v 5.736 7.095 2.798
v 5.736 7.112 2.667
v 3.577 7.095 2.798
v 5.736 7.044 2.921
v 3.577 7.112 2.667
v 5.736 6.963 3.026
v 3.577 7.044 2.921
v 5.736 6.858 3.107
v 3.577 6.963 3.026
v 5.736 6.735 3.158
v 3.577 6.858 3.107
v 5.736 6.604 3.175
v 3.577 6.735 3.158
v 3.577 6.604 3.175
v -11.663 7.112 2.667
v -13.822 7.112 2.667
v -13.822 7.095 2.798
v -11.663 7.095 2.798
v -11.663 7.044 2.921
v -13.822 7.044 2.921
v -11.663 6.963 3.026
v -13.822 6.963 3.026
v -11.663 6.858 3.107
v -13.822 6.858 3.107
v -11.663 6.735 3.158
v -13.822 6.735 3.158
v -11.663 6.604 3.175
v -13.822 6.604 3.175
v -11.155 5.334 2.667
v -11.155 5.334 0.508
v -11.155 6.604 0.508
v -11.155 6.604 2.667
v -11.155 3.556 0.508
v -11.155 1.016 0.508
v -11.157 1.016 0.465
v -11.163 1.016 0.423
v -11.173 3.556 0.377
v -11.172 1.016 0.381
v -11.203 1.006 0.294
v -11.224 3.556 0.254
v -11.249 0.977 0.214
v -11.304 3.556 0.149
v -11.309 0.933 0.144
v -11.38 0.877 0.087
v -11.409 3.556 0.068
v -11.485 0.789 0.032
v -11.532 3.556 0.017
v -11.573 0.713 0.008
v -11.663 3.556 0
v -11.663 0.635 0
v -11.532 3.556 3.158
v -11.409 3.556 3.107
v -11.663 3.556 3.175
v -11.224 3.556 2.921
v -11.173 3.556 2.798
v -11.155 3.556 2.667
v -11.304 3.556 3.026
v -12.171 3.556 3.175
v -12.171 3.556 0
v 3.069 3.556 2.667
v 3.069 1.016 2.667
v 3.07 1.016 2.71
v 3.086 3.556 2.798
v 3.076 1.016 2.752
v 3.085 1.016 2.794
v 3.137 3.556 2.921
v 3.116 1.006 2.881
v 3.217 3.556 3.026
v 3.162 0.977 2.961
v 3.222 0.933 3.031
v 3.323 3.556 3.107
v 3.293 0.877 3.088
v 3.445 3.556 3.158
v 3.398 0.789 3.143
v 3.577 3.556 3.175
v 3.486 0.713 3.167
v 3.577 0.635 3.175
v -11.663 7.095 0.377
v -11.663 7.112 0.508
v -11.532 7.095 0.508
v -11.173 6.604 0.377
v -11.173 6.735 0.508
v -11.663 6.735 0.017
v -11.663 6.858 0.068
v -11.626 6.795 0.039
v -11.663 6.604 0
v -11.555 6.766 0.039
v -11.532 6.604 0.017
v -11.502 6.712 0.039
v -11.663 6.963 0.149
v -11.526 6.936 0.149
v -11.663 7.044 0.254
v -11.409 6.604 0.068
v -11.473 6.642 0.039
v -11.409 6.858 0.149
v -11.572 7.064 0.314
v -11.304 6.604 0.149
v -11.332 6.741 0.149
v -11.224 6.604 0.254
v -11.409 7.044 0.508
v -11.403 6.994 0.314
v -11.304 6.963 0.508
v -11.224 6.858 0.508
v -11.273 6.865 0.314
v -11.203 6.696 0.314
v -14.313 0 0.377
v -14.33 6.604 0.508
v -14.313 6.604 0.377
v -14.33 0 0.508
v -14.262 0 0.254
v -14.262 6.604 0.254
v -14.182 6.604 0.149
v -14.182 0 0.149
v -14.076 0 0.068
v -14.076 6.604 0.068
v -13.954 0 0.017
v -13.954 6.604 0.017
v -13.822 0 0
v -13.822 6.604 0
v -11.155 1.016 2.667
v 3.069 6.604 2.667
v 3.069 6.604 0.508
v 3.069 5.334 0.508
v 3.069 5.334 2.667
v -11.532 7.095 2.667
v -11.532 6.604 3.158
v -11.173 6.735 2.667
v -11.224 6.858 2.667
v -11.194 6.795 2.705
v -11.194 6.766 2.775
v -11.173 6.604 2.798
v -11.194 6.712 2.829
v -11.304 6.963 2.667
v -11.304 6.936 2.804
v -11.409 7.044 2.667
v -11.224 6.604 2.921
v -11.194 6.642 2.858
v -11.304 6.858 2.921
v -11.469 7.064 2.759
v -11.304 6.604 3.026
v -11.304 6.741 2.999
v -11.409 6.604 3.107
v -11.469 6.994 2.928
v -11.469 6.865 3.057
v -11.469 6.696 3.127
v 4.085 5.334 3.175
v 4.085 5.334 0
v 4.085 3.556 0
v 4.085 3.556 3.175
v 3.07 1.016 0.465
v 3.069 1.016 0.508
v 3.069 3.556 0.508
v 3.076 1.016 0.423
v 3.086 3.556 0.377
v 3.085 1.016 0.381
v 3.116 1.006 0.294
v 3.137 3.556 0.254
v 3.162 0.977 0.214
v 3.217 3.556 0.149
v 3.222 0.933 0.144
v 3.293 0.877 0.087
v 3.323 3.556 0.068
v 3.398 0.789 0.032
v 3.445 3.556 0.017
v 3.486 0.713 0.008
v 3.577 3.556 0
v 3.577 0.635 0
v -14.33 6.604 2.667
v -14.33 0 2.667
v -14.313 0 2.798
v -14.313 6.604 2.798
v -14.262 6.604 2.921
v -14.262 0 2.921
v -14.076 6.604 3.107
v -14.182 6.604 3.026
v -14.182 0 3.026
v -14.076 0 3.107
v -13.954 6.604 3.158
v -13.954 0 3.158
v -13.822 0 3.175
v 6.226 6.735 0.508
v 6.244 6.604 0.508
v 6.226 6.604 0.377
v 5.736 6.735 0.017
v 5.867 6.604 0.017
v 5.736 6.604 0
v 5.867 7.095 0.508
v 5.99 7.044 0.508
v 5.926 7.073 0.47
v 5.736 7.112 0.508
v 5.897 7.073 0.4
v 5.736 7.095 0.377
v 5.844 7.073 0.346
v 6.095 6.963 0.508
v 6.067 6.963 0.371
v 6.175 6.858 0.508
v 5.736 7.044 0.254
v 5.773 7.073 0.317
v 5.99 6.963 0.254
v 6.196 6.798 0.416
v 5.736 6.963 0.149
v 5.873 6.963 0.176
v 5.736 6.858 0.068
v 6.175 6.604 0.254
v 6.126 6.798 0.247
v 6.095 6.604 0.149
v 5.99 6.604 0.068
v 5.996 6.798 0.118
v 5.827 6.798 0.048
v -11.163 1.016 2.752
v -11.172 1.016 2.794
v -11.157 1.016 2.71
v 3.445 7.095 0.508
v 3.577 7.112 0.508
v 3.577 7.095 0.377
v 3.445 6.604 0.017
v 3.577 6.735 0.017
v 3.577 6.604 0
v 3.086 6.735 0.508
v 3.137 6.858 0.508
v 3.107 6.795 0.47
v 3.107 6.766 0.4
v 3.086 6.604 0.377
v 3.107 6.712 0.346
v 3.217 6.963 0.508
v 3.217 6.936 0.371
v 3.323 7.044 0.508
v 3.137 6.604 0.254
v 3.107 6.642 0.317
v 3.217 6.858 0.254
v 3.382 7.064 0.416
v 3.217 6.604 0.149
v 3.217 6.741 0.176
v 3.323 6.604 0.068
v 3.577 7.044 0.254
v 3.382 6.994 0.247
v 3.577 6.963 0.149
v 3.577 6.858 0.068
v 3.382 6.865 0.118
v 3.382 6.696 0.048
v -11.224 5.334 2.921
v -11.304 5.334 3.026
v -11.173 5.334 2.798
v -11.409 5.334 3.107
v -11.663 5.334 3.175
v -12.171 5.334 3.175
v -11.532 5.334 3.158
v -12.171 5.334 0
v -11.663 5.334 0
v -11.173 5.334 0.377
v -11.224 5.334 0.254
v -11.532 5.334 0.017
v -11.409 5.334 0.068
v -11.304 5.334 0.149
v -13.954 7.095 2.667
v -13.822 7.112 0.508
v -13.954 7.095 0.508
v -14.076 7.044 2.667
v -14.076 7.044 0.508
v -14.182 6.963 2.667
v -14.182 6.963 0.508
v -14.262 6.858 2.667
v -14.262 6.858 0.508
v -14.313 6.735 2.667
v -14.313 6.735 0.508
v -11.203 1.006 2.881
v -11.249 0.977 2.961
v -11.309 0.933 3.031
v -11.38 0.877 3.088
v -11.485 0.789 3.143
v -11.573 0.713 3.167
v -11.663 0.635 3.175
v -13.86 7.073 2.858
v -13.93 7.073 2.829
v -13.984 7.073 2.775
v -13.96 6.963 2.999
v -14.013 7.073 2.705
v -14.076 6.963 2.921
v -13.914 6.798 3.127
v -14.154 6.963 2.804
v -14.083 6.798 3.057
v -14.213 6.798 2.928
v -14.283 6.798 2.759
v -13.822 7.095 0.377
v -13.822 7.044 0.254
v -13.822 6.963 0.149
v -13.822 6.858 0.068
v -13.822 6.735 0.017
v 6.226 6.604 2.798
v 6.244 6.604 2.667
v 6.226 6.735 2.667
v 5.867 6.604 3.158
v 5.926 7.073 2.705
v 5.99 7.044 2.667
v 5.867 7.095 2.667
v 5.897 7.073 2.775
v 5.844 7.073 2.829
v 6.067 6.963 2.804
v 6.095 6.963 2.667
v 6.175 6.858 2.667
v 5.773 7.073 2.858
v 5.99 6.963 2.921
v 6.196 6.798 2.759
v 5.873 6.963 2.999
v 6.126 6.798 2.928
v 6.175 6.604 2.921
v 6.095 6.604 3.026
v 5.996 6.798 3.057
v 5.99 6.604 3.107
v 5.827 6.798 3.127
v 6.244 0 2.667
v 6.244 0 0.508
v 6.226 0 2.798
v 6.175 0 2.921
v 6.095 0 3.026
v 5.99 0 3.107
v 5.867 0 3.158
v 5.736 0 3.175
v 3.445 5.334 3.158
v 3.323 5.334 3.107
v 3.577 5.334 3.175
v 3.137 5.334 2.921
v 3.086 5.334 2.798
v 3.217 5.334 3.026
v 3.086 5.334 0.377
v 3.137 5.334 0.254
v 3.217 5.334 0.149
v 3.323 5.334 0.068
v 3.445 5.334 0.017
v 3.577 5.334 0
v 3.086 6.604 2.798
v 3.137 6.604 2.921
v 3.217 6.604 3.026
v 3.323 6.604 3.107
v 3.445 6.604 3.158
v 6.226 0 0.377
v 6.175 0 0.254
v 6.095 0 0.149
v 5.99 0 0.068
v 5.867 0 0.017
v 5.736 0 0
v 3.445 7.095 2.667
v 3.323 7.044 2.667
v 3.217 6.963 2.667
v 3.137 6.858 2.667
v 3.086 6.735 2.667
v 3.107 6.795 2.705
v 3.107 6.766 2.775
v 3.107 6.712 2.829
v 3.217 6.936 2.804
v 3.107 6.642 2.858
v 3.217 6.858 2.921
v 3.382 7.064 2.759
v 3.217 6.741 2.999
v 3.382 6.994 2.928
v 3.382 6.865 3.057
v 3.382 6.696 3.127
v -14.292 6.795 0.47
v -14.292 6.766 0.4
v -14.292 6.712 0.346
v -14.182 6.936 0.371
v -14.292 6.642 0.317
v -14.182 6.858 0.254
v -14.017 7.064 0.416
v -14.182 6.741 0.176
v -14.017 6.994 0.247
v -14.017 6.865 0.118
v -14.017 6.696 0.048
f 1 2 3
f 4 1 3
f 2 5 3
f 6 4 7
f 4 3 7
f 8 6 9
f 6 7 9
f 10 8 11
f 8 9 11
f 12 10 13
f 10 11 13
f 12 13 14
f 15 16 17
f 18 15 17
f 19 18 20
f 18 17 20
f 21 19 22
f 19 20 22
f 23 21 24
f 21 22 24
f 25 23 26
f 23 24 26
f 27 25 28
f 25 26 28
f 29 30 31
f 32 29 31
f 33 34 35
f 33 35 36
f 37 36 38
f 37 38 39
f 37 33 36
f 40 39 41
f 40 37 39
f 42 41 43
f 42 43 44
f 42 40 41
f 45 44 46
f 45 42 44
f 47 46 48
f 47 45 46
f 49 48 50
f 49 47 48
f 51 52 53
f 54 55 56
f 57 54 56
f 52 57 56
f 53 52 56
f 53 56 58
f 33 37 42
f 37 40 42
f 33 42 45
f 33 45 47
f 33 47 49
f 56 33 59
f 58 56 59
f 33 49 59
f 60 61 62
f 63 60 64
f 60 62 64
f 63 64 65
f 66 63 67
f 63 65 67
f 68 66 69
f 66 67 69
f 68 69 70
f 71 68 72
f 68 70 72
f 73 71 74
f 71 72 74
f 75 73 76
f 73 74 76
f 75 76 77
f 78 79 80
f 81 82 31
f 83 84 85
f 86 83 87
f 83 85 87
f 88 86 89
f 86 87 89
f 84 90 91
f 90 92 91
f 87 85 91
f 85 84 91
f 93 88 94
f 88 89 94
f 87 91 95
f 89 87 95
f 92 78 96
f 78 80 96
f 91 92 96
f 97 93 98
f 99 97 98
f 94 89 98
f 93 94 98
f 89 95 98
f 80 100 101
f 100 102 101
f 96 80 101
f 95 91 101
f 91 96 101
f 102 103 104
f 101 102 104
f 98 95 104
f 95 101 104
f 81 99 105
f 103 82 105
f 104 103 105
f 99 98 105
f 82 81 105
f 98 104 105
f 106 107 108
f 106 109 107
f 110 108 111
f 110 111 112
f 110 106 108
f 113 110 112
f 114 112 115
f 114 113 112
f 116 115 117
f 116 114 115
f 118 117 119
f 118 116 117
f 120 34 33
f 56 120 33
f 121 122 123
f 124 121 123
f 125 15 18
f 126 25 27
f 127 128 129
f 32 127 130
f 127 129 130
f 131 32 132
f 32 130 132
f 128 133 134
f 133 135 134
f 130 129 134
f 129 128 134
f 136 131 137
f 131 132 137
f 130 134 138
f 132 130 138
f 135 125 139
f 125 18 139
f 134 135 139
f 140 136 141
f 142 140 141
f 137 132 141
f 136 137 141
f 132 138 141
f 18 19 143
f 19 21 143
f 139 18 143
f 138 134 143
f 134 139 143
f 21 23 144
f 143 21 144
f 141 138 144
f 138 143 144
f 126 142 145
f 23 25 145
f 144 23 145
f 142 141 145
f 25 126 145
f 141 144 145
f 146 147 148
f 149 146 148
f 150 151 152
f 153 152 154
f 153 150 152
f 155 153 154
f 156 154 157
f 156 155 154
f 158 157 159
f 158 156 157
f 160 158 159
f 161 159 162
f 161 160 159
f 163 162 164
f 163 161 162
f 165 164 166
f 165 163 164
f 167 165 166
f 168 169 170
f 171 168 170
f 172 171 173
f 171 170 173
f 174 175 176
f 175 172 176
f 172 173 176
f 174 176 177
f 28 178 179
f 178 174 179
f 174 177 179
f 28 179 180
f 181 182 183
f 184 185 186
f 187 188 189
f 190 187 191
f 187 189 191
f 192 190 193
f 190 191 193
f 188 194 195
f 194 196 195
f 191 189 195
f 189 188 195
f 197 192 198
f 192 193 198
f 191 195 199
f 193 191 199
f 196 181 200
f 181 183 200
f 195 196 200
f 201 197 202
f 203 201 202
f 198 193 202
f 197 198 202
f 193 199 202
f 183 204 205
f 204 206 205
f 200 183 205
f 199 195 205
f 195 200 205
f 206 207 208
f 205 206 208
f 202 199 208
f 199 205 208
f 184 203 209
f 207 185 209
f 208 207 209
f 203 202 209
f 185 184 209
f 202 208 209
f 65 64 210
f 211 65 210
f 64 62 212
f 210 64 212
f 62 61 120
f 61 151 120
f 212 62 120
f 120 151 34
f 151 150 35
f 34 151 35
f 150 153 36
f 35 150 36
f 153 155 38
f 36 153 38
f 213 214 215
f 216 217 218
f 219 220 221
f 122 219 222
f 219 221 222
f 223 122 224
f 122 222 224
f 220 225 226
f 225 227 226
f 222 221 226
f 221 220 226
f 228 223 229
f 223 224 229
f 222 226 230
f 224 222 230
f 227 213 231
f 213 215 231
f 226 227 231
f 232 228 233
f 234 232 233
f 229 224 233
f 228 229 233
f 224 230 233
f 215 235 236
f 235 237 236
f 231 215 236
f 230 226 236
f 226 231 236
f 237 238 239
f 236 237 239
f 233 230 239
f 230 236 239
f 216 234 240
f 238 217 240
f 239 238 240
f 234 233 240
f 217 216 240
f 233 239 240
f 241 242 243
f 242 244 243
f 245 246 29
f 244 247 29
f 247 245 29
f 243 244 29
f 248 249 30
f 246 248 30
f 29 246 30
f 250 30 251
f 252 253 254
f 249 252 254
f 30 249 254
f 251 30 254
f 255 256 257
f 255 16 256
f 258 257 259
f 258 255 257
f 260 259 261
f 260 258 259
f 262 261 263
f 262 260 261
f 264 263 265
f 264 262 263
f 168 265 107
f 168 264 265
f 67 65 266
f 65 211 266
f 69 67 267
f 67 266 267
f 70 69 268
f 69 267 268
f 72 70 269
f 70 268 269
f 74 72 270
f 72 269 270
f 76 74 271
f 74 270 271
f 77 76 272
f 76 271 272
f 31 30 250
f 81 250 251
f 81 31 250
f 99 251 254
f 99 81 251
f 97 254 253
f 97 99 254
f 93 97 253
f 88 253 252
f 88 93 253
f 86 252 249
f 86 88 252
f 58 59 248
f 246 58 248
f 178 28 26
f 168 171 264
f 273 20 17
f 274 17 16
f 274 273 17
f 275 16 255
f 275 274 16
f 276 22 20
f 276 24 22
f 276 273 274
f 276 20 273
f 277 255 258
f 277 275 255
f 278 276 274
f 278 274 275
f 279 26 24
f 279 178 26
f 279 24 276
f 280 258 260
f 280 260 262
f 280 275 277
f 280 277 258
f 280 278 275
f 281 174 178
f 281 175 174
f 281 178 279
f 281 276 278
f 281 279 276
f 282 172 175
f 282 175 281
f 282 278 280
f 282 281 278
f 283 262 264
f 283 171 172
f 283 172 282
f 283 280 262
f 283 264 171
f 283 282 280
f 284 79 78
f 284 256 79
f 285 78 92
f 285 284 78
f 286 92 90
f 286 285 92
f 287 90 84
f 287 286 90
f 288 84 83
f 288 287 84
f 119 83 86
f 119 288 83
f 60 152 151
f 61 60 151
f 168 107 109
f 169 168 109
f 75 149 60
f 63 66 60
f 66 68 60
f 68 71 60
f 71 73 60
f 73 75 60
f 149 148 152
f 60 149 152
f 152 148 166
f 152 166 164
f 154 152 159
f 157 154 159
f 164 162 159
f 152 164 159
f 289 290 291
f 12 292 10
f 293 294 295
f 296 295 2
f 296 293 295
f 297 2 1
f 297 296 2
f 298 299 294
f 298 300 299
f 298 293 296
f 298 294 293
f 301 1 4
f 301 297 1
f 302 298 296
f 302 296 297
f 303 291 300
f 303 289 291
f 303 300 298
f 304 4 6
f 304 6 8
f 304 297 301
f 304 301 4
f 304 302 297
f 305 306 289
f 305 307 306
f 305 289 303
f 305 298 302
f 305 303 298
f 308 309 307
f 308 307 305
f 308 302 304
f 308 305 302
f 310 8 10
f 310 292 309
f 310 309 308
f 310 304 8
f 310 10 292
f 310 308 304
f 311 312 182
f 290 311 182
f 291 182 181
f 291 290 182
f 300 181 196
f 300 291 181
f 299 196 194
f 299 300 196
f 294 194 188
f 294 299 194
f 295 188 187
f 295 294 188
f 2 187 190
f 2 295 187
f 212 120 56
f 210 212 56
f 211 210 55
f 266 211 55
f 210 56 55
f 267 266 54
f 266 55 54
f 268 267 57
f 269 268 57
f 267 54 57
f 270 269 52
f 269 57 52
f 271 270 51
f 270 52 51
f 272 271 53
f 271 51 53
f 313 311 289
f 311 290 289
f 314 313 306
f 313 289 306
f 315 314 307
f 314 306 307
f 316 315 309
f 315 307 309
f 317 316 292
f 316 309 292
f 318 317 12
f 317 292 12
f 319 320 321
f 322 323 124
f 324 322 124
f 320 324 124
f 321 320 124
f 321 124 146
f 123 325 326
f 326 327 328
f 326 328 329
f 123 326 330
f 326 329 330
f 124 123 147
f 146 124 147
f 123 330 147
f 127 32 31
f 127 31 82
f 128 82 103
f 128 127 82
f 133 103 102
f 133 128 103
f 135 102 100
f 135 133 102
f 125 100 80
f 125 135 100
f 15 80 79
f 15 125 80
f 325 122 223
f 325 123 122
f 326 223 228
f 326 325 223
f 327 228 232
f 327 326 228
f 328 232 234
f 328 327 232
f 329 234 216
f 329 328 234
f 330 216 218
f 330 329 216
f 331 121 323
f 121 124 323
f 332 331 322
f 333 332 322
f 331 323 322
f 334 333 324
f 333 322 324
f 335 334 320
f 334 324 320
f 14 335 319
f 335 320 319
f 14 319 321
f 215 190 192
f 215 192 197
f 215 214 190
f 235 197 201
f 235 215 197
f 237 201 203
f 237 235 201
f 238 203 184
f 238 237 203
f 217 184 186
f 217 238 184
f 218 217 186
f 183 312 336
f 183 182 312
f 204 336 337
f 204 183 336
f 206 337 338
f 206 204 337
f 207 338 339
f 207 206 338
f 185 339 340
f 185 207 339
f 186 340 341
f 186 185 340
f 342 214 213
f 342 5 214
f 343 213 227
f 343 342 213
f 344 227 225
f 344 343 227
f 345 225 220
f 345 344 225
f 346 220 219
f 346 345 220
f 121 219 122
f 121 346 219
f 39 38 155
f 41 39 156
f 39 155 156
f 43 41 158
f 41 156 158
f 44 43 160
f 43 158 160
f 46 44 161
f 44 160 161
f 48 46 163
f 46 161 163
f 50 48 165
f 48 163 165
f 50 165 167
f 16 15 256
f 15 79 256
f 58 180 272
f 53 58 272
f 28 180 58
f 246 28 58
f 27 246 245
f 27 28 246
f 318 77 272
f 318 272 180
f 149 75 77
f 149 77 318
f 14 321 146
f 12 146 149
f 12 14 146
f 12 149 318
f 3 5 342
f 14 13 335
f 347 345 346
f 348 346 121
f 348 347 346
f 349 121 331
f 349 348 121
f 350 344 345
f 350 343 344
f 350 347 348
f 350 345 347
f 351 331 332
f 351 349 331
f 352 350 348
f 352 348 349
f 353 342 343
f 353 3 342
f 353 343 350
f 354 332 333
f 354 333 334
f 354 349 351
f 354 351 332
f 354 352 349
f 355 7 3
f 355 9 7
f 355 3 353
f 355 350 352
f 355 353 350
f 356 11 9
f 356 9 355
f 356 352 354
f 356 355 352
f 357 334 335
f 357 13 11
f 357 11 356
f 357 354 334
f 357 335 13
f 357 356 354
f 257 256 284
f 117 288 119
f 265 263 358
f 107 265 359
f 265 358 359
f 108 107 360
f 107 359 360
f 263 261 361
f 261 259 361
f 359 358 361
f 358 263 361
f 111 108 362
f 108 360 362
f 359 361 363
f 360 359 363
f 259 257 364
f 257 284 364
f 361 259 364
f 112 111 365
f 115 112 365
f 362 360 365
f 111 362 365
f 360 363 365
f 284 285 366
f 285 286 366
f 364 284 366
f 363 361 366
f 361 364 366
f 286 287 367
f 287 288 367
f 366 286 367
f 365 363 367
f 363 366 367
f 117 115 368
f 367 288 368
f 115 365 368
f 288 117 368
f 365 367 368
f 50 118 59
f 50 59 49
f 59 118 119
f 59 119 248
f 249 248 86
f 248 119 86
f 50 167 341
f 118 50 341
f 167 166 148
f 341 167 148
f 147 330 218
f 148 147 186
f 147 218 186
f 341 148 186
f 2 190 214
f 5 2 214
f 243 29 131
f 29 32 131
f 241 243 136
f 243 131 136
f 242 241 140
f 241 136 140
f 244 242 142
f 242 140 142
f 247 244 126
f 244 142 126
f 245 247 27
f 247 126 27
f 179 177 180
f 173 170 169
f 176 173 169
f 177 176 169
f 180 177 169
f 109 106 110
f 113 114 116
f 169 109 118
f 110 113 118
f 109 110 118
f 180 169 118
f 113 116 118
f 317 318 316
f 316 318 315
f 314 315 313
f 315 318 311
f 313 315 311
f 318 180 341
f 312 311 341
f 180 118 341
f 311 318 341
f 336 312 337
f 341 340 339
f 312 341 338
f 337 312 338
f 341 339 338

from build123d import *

# Parameters (mm, degrees)
F1_DEPTH = 3.175
F2_R     = 0.508
F3_R     = 0.381


with BuildPart() as f1:
    # F0 (on Top) → F1 (new body)
    with BuildSketch(Plane.XY):
        Polygon((-14.330484, 1.016), (-14.330484, 0), (6.243516, 0), (6.243516, 1.016), (6.243516, 7.112), (3.068516, 7.112), (3.068516, 5.334), (4.084516, 5.334), (4.084516, 3.556), (3.068516, 3.556), (3.068516, 1.016), (-11.155484, 1.016), (-11.155484, 3.556), (-12.171484, 3.556), (-12.171484, 5.334), (-11.155484, 5.334), (-11.155484, 7.112), (-14.330484, 7.112), align=None)
    extrude(amount=F1_DEPTH)

    # F2
    f2_edges = [f1.edges().sort_by_distance(p)[0] for p in [
        (-11.155484, 2.286, 3.175),
        (-11.155484, 2.286, 0),
        (3.068516, 2.286, 3.175),
        (6.243516, 3.556, 3.175),
        (6.243516, 3.556, 0),
        (-14.330484, 3.556, 3.175),
        (-12.742984, 7.112, 3.175),
        (6.243516, 7.112, 1.5875),
        (4.656016, 7.112, 3.175),
        (4.656016, 7.112, 0),
        (3.068516, 7.112, 1.5875),
        (-11.155484, 7.112, 1.5875),
        (-12.742984, 7.112, 0),
        (-14.330484, 7.112, 1.5875),
        (-11.155484, 6.223, 3.175),
        (-11.155484, 6.223, 0),
        (3.068516, 6.223, 3.175),
        (3.068516, 6.223, 0),
        (3.068516, 2.286, 0),
        (-14.330484, 3.556, 0),
    ]]
    fillet(f2_edges, radius=F2_R)

    # F3
    f3_edges = [f1.edges().sort_by_distance(p)[0] for p in [
        (-4.043484, 1.016, 0),
        (-4.043484, 1.016, 3.175),
    ]]
    fillet(f3_edges, radius=F3_R)


solid = f1.part
